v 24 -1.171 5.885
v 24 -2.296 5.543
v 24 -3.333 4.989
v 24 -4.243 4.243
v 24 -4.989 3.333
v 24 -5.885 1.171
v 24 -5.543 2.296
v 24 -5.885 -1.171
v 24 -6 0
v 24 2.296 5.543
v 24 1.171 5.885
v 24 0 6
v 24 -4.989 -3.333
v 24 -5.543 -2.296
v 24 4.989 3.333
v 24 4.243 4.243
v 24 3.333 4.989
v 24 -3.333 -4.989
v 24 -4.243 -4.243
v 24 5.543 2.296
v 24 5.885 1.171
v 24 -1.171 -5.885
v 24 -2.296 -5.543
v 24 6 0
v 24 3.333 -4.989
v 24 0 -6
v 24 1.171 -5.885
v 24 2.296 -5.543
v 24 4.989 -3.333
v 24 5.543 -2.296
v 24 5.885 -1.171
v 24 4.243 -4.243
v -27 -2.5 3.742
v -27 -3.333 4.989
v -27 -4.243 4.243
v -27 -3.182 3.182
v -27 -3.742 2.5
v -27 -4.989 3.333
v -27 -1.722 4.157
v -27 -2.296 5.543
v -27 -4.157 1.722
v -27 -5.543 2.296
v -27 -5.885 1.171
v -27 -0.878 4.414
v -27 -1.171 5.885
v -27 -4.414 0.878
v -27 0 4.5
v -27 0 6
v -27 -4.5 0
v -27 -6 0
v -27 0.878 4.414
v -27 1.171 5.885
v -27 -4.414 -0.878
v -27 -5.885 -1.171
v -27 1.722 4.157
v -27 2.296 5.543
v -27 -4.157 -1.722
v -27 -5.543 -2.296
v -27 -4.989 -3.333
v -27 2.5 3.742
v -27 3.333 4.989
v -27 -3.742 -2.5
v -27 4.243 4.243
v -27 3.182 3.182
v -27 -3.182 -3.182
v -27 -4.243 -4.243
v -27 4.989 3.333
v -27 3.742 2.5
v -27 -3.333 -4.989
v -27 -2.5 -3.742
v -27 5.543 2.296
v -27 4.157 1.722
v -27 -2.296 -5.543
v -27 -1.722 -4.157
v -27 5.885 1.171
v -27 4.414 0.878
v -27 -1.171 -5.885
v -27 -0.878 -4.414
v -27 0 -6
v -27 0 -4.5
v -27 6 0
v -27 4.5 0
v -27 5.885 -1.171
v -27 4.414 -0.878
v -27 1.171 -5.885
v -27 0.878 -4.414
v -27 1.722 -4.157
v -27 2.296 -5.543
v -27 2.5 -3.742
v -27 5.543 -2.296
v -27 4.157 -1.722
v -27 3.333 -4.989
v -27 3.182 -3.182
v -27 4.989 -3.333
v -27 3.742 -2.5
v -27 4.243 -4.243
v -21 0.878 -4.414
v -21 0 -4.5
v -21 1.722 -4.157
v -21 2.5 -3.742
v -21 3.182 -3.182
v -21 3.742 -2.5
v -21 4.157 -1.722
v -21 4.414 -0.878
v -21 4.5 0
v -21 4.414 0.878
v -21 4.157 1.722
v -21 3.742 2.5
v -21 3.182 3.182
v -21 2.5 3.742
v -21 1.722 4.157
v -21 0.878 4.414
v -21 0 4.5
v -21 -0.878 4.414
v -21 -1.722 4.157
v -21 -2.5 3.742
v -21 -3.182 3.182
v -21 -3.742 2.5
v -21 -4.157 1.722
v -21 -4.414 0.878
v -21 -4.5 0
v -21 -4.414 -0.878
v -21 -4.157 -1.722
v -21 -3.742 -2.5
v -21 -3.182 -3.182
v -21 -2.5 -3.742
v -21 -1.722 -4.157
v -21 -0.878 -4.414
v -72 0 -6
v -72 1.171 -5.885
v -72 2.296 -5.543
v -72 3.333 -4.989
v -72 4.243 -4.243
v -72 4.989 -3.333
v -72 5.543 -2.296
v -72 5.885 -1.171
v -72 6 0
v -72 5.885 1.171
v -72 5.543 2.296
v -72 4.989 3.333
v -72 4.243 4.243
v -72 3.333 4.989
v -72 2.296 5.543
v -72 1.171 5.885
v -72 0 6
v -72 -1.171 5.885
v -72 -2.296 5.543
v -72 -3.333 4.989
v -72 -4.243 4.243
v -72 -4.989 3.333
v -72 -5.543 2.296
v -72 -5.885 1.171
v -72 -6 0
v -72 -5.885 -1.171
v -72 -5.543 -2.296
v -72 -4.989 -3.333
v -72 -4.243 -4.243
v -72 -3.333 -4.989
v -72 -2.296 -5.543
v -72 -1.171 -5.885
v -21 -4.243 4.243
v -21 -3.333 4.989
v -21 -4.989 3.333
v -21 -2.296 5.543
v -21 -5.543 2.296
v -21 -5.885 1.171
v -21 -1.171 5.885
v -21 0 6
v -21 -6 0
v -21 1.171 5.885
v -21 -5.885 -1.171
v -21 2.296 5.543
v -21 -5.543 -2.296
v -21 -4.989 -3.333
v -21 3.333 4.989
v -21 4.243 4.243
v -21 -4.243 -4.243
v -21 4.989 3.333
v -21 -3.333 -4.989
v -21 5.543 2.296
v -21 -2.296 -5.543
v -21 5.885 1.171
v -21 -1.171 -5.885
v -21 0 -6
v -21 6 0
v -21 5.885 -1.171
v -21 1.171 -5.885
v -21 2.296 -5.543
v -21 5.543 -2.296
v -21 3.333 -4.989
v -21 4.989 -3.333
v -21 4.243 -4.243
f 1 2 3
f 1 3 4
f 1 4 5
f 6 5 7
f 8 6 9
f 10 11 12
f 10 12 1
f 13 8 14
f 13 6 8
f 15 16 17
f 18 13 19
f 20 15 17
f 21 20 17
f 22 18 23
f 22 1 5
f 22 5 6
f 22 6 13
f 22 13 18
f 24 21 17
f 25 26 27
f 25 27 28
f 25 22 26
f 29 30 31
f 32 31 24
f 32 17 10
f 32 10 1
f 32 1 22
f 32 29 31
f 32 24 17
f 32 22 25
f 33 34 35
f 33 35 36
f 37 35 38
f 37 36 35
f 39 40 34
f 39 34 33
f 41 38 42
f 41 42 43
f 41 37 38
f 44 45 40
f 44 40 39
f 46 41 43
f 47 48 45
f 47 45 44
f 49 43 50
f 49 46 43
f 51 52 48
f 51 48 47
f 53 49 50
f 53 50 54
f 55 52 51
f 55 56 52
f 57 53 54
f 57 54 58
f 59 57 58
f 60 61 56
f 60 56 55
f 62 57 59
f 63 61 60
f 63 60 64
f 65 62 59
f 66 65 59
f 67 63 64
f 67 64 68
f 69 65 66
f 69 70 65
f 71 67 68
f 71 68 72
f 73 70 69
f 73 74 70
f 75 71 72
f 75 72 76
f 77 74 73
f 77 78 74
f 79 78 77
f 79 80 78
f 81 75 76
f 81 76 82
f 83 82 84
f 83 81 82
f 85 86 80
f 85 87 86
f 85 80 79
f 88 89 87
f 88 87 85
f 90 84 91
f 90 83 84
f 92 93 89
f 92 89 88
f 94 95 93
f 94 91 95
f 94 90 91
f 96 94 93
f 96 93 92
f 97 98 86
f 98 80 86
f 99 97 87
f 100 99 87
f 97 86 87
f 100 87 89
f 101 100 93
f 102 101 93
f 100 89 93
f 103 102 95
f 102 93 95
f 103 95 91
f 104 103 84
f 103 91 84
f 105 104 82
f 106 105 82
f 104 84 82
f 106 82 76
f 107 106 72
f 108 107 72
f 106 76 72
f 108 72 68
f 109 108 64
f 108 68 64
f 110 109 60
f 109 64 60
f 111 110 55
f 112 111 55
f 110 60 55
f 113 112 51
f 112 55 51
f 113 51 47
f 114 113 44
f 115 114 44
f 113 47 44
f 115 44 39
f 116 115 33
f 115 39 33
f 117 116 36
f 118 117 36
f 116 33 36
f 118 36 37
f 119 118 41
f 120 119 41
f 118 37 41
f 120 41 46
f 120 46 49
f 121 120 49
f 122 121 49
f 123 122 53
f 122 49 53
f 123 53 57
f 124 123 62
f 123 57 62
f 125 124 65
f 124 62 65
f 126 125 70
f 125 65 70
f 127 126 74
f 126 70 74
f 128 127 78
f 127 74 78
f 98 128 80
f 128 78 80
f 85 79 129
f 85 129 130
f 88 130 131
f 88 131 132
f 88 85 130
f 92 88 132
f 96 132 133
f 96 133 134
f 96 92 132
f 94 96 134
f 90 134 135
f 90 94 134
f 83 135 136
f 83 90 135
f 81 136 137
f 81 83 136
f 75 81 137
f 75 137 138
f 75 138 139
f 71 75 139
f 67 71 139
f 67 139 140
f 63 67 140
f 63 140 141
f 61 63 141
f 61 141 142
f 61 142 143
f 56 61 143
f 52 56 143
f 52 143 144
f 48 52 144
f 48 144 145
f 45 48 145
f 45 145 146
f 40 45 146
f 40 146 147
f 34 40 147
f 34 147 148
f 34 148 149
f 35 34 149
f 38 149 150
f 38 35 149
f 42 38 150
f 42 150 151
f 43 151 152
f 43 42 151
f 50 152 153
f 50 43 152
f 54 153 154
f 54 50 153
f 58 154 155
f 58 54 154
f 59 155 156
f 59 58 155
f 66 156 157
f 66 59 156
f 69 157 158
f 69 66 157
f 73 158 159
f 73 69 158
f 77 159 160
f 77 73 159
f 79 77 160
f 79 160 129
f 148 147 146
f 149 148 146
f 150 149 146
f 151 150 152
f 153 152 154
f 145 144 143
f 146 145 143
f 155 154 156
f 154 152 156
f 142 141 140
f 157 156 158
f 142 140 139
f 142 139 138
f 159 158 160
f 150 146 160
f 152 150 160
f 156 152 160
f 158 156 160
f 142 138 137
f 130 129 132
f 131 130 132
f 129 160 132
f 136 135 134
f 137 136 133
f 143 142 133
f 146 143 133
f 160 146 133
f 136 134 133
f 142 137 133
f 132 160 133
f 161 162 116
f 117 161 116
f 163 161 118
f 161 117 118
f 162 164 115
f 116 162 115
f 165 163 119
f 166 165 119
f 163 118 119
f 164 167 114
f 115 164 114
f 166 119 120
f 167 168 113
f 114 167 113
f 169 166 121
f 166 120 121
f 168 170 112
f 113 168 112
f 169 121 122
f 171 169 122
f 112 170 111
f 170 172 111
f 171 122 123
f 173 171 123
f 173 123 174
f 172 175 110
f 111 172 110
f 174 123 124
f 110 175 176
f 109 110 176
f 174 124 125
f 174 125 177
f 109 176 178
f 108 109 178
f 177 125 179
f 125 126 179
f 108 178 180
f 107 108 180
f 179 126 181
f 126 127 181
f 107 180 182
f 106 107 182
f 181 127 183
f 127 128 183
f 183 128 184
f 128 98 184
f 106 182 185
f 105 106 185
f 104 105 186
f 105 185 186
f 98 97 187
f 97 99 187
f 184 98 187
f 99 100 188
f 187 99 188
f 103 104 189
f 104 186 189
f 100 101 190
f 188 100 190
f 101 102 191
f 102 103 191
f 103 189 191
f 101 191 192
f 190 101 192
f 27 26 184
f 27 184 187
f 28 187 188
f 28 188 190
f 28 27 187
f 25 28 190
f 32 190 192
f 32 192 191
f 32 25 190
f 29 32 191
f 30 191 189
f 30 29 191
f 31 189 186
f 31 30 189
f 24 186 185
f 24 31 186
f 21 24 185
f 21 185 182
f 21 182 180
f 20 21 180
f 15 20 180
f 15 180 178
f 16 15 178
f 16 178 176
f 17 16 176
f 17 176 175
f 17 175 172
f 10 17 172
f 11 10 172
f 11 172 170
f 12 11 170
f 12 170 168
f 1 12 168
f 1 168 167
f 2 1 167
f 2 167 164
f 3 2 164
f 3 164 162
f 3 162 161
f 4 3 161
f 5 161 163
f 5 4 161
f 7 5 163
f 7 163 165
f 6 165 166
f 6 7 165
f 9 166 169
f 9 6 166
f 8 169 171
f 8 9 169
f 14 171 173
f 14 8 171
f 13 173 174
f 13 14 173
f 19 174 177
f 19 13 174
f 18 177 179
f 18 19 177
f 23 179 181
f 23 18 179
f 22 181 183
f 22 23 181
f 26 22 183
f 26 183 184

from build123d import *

# Parameters (mm, degrees)
SKETCH3_R           = 6
BOSS_EXTRUDE1_DEPTH = 96
SKETCH4_R           = 7.659234512
SKETCH4_R_2         = 4.5
CUT_EXTRUDE1_DEPTH  = 3


with BuildPart() as part:
    # Sketch3 → Boss-Extrude1 (new body)
    with BuildSketch(Plane(origin=(24, 0, 0), x_dir=(0, 0, -1), z_dir=(1, 0, 0))):
        Circle(SKETCH3_R)
    extrude(amount=-BOSS_EXTRUDE1_DEPTH)

    # Sketch4 → Cut-Extrude1 (cut, symmetric)
    with BuildSketch(Plane(origin=(-24, 0, 0), x_dir=(0, 0, -1), z_dir=(1, 0, 0))):
        Circle(SKETCH4_R)
        Circle(SKETCH4_R_2, mode=Mode.SUBTRACT)
    extrude(amount=CUT_EXTRUDE1_DEPTH, both=True, mode=Mode.SUBTRACT)


solid = part.part
